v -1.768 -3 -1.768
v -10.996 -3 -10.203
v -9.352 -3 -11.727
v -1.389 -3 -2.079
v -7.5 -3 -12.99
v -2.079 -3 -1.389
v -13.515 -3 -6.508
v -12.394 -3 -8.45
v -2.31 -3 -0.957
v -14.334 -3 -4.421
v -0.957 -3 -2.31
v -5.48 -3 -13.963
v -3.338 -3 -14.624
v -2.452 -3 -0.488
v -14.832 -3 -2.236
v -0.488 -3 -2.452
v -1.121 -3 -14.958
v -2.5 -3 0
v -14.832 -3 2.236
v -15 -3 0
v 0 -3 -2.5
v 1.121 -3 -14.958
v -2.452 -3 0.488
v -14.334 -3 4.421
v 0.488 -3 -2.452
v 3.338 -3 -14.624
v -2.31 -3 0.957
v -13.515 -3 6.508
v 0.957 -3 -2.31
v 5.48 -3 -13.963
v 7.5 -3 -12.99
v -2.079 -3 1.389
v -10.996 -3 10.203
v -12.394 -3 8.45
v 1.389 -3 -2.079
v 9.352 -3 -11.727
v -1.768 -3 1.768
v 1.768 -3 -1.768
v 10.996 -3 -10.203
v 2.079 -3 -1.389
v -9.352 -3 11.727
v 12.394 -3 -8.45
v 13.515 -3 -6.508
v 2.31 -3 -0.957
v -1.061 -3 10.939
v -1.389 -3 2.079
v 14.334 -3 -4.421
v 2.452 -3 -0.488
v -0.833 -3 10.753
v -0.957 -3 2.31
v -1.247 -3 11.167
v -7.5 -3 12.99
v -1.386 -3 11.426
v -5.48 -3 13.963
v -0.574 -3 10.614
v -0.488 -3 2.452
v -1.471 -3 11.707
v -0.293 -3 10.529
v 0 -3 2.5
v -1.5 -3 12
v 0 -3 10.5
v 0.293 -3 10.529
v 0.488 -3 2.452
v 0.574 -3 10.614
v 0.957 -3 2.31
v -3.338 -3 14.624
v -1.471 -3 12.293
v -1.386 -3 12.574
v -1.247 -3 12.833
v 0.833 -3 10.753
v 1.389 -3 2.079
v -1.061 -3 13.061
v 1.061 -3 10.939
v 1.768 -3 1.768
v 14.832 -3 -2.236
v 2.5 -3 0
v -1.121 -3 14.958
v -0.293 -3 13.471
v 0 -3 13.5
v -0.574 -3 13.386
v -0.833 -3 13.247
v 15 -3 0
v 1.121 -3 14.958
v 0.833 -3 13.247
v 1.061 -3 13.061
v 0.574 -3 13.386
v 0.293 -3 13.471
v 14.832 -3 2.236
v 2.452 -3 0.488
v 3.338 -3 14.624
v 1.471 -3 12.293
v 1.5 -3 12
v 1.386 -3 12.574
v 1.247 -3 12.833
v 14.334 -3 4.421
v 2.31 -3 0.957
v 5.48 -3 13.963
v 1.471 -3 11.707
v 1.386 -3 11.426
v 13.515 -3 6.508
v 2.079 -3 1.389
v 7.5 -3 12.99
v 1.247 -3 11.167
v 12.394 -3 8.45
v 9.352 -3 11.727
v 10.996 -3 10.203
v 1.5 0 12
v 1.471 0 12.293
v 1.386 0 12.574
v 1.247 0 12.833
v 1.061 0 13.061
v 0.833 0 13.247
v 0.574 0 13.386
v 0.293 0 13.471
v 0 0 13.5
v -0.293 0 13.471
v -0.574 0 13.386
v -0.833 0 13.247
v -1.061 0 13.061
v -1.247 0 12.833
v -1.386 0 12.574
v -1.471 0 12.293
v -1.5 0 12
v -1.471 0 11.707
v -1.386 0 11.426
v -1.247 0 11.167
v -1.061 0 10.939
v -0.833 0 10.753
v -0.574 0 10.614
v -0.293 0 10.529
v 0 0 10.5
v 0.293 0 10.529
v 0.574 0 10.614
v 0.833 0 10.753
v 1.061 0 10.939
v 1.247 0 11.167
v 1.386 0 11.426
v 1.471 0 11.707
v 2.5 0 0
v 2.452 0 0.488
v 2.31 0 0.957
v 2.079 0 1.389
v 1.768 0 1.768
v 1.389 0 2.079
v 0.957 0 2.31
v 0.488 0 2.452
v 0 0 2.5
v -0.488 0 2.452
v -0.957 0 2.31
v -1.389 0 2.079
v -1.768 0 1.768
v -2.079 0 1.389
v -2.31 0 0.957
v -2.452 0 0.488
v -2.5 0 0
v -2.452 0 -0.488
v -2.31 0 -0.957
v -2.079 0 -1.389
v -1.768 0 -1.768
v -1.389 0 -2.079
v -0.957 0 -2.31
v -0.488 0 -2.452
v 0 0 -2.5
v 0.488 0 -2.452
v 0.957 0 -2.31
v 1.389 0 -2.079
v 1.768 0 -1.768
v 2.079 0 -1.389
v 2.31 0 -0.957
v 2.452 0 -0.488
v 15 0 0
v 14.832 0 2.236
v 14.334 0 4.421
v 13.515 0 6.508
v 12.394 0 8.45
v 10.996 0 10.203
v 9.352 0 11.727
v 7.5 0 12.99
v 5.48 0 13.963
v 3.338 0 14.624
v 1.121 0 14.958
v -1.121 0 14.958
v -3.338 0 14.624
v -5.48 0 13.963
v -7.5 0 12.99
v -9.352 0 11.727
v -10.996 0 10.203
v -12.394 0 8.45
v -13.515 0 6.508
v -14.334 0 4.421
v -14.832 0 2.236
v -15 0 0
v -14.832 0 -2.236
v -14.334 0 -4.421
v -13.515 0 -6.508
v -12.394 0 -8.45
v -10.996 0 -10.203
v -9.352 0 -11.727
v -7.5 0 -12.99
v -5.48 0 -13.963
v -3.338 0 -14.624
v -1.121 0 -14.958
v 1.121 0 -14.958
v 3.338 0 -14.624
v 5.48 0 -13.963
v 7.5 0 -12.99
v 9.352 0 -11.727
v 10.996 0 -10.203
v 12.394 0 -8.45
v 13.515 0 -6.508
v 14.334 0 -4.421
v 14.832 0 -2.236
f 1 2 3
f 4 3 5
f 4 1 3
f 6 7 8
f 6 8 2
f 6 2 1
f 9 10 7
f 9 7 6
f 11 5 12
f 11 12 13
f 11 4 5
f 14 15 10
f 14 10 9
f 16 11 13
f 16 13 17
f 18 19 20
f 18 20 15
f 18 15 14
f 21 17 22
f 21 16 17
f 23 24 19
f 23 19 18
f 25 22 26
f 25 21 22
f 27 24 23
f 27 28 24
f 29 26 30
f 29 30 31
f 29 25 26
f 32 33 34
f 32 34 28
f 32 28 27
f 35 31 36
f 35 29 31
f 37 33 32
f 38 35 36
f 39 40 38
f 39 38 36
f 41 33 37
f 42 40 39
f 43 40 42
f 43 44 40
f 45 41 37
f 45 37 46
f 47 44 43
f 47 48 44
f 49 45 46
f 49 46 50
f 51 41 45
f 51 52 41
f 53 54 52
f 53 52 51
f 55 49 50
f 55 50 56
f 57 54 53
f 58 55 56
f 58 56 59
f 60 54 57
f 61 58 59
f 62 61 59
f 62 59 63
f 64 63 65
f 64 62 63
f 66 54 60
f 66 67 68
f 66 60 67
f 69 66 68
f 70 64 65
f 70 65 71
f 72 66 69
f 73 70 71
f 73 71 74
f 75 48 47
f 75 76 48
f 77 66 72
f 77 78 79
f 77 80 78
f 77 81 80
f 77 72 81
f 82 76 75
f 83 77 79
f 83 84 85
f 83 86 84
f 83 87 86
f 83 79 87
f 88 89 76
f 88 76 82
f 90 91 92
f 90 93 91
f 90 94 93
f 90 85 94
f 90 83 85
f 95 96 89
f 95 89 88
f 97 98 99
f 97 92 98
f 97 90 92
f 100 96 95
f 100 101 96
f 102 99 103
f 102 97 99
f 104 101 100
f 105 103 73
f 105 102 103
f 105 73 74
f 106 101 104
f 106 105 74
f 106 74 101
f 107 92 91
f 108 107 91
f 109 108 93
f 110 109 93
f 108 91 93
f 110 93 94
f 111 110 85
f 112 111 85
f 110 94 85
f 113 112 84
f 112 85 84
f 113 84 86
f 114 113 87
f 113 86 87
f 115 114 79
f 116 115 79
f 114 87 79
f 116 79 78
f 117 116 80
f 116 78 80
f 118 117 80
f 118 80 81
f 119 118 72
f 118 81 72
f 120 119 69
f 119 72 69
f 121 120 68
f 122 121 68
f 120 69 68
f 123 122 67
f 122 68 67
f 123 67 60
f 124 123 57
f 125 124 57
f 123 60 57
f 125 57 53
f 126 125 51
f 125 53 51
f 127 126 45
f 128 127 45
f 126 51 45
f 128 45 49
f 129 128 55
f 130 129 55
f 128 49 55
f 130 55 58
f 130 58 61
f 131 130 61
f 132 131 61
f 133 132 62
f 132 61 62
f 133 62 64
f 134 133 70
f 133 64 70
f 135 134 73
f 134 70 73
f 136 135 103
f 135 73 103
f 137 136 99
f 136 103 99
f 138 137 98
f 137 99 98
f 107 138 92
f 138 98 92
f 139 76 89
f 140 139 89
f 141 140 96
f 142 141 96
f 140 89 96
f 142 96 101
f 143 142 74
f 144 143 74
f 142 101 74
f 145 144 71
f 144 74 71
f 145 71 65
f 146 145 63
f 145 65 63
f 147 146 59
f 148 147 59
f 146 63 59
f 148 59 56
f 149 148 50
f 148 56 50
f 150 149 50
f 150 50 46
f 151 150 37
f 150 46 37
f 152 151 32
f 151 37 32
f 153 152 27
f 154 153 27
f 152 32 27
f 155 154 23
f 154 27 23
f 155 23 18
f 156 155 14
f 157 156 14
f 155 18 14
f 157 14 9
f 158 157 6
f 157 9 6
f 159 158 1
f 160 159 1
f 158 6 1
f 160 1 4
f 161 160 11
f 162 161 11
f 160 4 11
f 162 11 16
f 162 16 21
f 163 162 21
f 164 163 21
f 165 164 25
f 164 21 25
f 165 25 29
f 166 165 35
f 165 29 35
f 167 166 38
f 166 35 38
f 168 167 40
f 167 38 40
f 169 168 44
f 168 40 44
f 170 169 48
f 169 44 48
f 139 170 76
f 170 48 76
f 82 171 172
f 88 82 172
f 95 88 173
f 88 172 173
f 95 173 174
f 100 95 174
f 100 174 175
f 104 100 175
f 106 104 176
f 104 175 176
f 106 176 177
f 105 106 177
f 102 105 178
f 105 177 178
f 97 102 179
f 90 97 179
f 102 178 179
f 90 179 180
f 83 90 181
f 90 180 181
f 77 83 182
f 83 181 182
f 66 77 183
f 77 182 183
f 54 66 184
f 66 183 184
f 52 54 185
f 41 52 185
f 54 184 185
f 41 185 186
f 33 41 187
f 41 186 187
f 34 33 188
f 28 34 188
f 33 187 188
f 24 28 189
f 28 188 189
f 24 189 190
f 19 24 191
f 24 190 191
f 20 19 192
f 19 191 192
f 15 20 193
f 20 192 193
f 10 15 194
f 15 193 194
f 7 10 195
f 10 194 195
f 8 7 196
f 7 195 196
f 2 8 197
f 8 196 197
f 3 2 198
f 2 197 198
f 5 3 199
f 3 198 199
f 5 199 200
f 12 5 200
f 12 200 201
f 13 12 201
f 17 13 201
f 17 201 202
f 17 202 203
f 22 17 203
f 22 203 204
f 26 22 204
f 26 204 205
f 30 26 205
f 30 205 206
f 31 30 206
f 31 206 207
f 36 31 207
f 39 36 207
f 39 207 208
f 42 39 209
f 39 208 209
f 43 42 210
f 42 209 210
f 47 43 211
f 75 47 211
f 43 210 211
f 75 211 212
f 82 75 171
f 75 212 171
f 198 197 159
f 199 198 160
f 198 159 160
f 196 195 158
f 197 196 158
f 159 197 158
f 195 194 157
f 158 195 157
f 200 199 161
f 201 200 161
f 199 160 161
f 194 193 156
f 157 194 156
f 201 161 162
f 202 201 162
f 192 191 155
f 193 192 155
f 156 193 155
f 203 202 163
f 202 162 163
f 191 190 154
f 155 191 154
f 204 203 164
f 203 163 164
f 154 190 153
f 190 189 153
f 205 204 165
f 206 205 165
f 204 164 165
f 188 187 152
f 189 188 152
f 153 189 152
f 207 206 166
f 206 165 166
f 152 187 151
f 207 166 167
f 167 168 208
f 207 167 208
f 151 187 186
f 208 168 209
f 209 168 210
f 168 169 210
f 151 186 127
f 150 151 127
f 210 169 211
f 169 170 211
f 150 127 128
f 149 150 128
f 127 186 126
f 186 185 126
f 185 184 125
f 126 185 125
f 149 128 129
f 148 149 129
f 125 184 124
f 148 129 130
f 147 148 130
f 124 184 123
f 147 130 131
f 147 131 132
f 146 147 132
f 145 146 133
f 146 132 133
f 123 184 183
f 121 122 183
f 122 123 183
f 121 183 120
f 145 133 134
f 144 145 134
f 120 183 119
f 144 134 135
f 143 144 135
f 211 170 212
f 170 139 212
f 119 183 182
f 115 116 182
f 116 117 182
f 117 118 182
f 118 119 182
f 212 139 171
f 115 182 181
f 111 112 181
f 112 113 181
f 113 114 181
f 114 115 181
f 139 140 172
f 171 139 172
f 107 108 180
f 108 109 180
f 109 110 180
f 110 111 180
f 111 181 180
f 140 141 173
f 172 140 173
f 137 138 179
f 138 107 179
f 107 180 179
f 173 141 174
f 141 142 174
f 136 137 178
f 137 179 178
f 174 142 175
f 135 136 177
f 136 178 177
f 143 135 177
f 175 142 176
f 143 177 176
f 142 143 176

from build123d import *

# Parameters (mm, degrees)
F0_R     = 15
F1_DEPTH = 3
F2_R     = 1.5
F3_DEPTH = 3
F4_R     = 2.5
F5_DEPTH = 3


with BuildPart() as f1:
    # F0 (on Front) → F1 (new body)
    with BuildSketch(Plane.XZ):
        Circle(F0_R)
    extrude(amount=F1_DEPTH)

    # F2 (on face) → F3 (cut, through all)
    with BuildSketch(Plane.XZ.offset(3)):
        with Locations((0, 12)):
            Circle(F2_R)
    extrude(amount=-F3_DEPTH, mode=Mode.SUBTRACT)

    # F4 (on face) → F5 (cut, through all)
    with BuildSketch(Plane.XZ.offset(3)):
        Circle(F4_R)
    extrude(amount=-F5_DEPTH, mode=Mode.SUBTRACT)


solid = f1.part
